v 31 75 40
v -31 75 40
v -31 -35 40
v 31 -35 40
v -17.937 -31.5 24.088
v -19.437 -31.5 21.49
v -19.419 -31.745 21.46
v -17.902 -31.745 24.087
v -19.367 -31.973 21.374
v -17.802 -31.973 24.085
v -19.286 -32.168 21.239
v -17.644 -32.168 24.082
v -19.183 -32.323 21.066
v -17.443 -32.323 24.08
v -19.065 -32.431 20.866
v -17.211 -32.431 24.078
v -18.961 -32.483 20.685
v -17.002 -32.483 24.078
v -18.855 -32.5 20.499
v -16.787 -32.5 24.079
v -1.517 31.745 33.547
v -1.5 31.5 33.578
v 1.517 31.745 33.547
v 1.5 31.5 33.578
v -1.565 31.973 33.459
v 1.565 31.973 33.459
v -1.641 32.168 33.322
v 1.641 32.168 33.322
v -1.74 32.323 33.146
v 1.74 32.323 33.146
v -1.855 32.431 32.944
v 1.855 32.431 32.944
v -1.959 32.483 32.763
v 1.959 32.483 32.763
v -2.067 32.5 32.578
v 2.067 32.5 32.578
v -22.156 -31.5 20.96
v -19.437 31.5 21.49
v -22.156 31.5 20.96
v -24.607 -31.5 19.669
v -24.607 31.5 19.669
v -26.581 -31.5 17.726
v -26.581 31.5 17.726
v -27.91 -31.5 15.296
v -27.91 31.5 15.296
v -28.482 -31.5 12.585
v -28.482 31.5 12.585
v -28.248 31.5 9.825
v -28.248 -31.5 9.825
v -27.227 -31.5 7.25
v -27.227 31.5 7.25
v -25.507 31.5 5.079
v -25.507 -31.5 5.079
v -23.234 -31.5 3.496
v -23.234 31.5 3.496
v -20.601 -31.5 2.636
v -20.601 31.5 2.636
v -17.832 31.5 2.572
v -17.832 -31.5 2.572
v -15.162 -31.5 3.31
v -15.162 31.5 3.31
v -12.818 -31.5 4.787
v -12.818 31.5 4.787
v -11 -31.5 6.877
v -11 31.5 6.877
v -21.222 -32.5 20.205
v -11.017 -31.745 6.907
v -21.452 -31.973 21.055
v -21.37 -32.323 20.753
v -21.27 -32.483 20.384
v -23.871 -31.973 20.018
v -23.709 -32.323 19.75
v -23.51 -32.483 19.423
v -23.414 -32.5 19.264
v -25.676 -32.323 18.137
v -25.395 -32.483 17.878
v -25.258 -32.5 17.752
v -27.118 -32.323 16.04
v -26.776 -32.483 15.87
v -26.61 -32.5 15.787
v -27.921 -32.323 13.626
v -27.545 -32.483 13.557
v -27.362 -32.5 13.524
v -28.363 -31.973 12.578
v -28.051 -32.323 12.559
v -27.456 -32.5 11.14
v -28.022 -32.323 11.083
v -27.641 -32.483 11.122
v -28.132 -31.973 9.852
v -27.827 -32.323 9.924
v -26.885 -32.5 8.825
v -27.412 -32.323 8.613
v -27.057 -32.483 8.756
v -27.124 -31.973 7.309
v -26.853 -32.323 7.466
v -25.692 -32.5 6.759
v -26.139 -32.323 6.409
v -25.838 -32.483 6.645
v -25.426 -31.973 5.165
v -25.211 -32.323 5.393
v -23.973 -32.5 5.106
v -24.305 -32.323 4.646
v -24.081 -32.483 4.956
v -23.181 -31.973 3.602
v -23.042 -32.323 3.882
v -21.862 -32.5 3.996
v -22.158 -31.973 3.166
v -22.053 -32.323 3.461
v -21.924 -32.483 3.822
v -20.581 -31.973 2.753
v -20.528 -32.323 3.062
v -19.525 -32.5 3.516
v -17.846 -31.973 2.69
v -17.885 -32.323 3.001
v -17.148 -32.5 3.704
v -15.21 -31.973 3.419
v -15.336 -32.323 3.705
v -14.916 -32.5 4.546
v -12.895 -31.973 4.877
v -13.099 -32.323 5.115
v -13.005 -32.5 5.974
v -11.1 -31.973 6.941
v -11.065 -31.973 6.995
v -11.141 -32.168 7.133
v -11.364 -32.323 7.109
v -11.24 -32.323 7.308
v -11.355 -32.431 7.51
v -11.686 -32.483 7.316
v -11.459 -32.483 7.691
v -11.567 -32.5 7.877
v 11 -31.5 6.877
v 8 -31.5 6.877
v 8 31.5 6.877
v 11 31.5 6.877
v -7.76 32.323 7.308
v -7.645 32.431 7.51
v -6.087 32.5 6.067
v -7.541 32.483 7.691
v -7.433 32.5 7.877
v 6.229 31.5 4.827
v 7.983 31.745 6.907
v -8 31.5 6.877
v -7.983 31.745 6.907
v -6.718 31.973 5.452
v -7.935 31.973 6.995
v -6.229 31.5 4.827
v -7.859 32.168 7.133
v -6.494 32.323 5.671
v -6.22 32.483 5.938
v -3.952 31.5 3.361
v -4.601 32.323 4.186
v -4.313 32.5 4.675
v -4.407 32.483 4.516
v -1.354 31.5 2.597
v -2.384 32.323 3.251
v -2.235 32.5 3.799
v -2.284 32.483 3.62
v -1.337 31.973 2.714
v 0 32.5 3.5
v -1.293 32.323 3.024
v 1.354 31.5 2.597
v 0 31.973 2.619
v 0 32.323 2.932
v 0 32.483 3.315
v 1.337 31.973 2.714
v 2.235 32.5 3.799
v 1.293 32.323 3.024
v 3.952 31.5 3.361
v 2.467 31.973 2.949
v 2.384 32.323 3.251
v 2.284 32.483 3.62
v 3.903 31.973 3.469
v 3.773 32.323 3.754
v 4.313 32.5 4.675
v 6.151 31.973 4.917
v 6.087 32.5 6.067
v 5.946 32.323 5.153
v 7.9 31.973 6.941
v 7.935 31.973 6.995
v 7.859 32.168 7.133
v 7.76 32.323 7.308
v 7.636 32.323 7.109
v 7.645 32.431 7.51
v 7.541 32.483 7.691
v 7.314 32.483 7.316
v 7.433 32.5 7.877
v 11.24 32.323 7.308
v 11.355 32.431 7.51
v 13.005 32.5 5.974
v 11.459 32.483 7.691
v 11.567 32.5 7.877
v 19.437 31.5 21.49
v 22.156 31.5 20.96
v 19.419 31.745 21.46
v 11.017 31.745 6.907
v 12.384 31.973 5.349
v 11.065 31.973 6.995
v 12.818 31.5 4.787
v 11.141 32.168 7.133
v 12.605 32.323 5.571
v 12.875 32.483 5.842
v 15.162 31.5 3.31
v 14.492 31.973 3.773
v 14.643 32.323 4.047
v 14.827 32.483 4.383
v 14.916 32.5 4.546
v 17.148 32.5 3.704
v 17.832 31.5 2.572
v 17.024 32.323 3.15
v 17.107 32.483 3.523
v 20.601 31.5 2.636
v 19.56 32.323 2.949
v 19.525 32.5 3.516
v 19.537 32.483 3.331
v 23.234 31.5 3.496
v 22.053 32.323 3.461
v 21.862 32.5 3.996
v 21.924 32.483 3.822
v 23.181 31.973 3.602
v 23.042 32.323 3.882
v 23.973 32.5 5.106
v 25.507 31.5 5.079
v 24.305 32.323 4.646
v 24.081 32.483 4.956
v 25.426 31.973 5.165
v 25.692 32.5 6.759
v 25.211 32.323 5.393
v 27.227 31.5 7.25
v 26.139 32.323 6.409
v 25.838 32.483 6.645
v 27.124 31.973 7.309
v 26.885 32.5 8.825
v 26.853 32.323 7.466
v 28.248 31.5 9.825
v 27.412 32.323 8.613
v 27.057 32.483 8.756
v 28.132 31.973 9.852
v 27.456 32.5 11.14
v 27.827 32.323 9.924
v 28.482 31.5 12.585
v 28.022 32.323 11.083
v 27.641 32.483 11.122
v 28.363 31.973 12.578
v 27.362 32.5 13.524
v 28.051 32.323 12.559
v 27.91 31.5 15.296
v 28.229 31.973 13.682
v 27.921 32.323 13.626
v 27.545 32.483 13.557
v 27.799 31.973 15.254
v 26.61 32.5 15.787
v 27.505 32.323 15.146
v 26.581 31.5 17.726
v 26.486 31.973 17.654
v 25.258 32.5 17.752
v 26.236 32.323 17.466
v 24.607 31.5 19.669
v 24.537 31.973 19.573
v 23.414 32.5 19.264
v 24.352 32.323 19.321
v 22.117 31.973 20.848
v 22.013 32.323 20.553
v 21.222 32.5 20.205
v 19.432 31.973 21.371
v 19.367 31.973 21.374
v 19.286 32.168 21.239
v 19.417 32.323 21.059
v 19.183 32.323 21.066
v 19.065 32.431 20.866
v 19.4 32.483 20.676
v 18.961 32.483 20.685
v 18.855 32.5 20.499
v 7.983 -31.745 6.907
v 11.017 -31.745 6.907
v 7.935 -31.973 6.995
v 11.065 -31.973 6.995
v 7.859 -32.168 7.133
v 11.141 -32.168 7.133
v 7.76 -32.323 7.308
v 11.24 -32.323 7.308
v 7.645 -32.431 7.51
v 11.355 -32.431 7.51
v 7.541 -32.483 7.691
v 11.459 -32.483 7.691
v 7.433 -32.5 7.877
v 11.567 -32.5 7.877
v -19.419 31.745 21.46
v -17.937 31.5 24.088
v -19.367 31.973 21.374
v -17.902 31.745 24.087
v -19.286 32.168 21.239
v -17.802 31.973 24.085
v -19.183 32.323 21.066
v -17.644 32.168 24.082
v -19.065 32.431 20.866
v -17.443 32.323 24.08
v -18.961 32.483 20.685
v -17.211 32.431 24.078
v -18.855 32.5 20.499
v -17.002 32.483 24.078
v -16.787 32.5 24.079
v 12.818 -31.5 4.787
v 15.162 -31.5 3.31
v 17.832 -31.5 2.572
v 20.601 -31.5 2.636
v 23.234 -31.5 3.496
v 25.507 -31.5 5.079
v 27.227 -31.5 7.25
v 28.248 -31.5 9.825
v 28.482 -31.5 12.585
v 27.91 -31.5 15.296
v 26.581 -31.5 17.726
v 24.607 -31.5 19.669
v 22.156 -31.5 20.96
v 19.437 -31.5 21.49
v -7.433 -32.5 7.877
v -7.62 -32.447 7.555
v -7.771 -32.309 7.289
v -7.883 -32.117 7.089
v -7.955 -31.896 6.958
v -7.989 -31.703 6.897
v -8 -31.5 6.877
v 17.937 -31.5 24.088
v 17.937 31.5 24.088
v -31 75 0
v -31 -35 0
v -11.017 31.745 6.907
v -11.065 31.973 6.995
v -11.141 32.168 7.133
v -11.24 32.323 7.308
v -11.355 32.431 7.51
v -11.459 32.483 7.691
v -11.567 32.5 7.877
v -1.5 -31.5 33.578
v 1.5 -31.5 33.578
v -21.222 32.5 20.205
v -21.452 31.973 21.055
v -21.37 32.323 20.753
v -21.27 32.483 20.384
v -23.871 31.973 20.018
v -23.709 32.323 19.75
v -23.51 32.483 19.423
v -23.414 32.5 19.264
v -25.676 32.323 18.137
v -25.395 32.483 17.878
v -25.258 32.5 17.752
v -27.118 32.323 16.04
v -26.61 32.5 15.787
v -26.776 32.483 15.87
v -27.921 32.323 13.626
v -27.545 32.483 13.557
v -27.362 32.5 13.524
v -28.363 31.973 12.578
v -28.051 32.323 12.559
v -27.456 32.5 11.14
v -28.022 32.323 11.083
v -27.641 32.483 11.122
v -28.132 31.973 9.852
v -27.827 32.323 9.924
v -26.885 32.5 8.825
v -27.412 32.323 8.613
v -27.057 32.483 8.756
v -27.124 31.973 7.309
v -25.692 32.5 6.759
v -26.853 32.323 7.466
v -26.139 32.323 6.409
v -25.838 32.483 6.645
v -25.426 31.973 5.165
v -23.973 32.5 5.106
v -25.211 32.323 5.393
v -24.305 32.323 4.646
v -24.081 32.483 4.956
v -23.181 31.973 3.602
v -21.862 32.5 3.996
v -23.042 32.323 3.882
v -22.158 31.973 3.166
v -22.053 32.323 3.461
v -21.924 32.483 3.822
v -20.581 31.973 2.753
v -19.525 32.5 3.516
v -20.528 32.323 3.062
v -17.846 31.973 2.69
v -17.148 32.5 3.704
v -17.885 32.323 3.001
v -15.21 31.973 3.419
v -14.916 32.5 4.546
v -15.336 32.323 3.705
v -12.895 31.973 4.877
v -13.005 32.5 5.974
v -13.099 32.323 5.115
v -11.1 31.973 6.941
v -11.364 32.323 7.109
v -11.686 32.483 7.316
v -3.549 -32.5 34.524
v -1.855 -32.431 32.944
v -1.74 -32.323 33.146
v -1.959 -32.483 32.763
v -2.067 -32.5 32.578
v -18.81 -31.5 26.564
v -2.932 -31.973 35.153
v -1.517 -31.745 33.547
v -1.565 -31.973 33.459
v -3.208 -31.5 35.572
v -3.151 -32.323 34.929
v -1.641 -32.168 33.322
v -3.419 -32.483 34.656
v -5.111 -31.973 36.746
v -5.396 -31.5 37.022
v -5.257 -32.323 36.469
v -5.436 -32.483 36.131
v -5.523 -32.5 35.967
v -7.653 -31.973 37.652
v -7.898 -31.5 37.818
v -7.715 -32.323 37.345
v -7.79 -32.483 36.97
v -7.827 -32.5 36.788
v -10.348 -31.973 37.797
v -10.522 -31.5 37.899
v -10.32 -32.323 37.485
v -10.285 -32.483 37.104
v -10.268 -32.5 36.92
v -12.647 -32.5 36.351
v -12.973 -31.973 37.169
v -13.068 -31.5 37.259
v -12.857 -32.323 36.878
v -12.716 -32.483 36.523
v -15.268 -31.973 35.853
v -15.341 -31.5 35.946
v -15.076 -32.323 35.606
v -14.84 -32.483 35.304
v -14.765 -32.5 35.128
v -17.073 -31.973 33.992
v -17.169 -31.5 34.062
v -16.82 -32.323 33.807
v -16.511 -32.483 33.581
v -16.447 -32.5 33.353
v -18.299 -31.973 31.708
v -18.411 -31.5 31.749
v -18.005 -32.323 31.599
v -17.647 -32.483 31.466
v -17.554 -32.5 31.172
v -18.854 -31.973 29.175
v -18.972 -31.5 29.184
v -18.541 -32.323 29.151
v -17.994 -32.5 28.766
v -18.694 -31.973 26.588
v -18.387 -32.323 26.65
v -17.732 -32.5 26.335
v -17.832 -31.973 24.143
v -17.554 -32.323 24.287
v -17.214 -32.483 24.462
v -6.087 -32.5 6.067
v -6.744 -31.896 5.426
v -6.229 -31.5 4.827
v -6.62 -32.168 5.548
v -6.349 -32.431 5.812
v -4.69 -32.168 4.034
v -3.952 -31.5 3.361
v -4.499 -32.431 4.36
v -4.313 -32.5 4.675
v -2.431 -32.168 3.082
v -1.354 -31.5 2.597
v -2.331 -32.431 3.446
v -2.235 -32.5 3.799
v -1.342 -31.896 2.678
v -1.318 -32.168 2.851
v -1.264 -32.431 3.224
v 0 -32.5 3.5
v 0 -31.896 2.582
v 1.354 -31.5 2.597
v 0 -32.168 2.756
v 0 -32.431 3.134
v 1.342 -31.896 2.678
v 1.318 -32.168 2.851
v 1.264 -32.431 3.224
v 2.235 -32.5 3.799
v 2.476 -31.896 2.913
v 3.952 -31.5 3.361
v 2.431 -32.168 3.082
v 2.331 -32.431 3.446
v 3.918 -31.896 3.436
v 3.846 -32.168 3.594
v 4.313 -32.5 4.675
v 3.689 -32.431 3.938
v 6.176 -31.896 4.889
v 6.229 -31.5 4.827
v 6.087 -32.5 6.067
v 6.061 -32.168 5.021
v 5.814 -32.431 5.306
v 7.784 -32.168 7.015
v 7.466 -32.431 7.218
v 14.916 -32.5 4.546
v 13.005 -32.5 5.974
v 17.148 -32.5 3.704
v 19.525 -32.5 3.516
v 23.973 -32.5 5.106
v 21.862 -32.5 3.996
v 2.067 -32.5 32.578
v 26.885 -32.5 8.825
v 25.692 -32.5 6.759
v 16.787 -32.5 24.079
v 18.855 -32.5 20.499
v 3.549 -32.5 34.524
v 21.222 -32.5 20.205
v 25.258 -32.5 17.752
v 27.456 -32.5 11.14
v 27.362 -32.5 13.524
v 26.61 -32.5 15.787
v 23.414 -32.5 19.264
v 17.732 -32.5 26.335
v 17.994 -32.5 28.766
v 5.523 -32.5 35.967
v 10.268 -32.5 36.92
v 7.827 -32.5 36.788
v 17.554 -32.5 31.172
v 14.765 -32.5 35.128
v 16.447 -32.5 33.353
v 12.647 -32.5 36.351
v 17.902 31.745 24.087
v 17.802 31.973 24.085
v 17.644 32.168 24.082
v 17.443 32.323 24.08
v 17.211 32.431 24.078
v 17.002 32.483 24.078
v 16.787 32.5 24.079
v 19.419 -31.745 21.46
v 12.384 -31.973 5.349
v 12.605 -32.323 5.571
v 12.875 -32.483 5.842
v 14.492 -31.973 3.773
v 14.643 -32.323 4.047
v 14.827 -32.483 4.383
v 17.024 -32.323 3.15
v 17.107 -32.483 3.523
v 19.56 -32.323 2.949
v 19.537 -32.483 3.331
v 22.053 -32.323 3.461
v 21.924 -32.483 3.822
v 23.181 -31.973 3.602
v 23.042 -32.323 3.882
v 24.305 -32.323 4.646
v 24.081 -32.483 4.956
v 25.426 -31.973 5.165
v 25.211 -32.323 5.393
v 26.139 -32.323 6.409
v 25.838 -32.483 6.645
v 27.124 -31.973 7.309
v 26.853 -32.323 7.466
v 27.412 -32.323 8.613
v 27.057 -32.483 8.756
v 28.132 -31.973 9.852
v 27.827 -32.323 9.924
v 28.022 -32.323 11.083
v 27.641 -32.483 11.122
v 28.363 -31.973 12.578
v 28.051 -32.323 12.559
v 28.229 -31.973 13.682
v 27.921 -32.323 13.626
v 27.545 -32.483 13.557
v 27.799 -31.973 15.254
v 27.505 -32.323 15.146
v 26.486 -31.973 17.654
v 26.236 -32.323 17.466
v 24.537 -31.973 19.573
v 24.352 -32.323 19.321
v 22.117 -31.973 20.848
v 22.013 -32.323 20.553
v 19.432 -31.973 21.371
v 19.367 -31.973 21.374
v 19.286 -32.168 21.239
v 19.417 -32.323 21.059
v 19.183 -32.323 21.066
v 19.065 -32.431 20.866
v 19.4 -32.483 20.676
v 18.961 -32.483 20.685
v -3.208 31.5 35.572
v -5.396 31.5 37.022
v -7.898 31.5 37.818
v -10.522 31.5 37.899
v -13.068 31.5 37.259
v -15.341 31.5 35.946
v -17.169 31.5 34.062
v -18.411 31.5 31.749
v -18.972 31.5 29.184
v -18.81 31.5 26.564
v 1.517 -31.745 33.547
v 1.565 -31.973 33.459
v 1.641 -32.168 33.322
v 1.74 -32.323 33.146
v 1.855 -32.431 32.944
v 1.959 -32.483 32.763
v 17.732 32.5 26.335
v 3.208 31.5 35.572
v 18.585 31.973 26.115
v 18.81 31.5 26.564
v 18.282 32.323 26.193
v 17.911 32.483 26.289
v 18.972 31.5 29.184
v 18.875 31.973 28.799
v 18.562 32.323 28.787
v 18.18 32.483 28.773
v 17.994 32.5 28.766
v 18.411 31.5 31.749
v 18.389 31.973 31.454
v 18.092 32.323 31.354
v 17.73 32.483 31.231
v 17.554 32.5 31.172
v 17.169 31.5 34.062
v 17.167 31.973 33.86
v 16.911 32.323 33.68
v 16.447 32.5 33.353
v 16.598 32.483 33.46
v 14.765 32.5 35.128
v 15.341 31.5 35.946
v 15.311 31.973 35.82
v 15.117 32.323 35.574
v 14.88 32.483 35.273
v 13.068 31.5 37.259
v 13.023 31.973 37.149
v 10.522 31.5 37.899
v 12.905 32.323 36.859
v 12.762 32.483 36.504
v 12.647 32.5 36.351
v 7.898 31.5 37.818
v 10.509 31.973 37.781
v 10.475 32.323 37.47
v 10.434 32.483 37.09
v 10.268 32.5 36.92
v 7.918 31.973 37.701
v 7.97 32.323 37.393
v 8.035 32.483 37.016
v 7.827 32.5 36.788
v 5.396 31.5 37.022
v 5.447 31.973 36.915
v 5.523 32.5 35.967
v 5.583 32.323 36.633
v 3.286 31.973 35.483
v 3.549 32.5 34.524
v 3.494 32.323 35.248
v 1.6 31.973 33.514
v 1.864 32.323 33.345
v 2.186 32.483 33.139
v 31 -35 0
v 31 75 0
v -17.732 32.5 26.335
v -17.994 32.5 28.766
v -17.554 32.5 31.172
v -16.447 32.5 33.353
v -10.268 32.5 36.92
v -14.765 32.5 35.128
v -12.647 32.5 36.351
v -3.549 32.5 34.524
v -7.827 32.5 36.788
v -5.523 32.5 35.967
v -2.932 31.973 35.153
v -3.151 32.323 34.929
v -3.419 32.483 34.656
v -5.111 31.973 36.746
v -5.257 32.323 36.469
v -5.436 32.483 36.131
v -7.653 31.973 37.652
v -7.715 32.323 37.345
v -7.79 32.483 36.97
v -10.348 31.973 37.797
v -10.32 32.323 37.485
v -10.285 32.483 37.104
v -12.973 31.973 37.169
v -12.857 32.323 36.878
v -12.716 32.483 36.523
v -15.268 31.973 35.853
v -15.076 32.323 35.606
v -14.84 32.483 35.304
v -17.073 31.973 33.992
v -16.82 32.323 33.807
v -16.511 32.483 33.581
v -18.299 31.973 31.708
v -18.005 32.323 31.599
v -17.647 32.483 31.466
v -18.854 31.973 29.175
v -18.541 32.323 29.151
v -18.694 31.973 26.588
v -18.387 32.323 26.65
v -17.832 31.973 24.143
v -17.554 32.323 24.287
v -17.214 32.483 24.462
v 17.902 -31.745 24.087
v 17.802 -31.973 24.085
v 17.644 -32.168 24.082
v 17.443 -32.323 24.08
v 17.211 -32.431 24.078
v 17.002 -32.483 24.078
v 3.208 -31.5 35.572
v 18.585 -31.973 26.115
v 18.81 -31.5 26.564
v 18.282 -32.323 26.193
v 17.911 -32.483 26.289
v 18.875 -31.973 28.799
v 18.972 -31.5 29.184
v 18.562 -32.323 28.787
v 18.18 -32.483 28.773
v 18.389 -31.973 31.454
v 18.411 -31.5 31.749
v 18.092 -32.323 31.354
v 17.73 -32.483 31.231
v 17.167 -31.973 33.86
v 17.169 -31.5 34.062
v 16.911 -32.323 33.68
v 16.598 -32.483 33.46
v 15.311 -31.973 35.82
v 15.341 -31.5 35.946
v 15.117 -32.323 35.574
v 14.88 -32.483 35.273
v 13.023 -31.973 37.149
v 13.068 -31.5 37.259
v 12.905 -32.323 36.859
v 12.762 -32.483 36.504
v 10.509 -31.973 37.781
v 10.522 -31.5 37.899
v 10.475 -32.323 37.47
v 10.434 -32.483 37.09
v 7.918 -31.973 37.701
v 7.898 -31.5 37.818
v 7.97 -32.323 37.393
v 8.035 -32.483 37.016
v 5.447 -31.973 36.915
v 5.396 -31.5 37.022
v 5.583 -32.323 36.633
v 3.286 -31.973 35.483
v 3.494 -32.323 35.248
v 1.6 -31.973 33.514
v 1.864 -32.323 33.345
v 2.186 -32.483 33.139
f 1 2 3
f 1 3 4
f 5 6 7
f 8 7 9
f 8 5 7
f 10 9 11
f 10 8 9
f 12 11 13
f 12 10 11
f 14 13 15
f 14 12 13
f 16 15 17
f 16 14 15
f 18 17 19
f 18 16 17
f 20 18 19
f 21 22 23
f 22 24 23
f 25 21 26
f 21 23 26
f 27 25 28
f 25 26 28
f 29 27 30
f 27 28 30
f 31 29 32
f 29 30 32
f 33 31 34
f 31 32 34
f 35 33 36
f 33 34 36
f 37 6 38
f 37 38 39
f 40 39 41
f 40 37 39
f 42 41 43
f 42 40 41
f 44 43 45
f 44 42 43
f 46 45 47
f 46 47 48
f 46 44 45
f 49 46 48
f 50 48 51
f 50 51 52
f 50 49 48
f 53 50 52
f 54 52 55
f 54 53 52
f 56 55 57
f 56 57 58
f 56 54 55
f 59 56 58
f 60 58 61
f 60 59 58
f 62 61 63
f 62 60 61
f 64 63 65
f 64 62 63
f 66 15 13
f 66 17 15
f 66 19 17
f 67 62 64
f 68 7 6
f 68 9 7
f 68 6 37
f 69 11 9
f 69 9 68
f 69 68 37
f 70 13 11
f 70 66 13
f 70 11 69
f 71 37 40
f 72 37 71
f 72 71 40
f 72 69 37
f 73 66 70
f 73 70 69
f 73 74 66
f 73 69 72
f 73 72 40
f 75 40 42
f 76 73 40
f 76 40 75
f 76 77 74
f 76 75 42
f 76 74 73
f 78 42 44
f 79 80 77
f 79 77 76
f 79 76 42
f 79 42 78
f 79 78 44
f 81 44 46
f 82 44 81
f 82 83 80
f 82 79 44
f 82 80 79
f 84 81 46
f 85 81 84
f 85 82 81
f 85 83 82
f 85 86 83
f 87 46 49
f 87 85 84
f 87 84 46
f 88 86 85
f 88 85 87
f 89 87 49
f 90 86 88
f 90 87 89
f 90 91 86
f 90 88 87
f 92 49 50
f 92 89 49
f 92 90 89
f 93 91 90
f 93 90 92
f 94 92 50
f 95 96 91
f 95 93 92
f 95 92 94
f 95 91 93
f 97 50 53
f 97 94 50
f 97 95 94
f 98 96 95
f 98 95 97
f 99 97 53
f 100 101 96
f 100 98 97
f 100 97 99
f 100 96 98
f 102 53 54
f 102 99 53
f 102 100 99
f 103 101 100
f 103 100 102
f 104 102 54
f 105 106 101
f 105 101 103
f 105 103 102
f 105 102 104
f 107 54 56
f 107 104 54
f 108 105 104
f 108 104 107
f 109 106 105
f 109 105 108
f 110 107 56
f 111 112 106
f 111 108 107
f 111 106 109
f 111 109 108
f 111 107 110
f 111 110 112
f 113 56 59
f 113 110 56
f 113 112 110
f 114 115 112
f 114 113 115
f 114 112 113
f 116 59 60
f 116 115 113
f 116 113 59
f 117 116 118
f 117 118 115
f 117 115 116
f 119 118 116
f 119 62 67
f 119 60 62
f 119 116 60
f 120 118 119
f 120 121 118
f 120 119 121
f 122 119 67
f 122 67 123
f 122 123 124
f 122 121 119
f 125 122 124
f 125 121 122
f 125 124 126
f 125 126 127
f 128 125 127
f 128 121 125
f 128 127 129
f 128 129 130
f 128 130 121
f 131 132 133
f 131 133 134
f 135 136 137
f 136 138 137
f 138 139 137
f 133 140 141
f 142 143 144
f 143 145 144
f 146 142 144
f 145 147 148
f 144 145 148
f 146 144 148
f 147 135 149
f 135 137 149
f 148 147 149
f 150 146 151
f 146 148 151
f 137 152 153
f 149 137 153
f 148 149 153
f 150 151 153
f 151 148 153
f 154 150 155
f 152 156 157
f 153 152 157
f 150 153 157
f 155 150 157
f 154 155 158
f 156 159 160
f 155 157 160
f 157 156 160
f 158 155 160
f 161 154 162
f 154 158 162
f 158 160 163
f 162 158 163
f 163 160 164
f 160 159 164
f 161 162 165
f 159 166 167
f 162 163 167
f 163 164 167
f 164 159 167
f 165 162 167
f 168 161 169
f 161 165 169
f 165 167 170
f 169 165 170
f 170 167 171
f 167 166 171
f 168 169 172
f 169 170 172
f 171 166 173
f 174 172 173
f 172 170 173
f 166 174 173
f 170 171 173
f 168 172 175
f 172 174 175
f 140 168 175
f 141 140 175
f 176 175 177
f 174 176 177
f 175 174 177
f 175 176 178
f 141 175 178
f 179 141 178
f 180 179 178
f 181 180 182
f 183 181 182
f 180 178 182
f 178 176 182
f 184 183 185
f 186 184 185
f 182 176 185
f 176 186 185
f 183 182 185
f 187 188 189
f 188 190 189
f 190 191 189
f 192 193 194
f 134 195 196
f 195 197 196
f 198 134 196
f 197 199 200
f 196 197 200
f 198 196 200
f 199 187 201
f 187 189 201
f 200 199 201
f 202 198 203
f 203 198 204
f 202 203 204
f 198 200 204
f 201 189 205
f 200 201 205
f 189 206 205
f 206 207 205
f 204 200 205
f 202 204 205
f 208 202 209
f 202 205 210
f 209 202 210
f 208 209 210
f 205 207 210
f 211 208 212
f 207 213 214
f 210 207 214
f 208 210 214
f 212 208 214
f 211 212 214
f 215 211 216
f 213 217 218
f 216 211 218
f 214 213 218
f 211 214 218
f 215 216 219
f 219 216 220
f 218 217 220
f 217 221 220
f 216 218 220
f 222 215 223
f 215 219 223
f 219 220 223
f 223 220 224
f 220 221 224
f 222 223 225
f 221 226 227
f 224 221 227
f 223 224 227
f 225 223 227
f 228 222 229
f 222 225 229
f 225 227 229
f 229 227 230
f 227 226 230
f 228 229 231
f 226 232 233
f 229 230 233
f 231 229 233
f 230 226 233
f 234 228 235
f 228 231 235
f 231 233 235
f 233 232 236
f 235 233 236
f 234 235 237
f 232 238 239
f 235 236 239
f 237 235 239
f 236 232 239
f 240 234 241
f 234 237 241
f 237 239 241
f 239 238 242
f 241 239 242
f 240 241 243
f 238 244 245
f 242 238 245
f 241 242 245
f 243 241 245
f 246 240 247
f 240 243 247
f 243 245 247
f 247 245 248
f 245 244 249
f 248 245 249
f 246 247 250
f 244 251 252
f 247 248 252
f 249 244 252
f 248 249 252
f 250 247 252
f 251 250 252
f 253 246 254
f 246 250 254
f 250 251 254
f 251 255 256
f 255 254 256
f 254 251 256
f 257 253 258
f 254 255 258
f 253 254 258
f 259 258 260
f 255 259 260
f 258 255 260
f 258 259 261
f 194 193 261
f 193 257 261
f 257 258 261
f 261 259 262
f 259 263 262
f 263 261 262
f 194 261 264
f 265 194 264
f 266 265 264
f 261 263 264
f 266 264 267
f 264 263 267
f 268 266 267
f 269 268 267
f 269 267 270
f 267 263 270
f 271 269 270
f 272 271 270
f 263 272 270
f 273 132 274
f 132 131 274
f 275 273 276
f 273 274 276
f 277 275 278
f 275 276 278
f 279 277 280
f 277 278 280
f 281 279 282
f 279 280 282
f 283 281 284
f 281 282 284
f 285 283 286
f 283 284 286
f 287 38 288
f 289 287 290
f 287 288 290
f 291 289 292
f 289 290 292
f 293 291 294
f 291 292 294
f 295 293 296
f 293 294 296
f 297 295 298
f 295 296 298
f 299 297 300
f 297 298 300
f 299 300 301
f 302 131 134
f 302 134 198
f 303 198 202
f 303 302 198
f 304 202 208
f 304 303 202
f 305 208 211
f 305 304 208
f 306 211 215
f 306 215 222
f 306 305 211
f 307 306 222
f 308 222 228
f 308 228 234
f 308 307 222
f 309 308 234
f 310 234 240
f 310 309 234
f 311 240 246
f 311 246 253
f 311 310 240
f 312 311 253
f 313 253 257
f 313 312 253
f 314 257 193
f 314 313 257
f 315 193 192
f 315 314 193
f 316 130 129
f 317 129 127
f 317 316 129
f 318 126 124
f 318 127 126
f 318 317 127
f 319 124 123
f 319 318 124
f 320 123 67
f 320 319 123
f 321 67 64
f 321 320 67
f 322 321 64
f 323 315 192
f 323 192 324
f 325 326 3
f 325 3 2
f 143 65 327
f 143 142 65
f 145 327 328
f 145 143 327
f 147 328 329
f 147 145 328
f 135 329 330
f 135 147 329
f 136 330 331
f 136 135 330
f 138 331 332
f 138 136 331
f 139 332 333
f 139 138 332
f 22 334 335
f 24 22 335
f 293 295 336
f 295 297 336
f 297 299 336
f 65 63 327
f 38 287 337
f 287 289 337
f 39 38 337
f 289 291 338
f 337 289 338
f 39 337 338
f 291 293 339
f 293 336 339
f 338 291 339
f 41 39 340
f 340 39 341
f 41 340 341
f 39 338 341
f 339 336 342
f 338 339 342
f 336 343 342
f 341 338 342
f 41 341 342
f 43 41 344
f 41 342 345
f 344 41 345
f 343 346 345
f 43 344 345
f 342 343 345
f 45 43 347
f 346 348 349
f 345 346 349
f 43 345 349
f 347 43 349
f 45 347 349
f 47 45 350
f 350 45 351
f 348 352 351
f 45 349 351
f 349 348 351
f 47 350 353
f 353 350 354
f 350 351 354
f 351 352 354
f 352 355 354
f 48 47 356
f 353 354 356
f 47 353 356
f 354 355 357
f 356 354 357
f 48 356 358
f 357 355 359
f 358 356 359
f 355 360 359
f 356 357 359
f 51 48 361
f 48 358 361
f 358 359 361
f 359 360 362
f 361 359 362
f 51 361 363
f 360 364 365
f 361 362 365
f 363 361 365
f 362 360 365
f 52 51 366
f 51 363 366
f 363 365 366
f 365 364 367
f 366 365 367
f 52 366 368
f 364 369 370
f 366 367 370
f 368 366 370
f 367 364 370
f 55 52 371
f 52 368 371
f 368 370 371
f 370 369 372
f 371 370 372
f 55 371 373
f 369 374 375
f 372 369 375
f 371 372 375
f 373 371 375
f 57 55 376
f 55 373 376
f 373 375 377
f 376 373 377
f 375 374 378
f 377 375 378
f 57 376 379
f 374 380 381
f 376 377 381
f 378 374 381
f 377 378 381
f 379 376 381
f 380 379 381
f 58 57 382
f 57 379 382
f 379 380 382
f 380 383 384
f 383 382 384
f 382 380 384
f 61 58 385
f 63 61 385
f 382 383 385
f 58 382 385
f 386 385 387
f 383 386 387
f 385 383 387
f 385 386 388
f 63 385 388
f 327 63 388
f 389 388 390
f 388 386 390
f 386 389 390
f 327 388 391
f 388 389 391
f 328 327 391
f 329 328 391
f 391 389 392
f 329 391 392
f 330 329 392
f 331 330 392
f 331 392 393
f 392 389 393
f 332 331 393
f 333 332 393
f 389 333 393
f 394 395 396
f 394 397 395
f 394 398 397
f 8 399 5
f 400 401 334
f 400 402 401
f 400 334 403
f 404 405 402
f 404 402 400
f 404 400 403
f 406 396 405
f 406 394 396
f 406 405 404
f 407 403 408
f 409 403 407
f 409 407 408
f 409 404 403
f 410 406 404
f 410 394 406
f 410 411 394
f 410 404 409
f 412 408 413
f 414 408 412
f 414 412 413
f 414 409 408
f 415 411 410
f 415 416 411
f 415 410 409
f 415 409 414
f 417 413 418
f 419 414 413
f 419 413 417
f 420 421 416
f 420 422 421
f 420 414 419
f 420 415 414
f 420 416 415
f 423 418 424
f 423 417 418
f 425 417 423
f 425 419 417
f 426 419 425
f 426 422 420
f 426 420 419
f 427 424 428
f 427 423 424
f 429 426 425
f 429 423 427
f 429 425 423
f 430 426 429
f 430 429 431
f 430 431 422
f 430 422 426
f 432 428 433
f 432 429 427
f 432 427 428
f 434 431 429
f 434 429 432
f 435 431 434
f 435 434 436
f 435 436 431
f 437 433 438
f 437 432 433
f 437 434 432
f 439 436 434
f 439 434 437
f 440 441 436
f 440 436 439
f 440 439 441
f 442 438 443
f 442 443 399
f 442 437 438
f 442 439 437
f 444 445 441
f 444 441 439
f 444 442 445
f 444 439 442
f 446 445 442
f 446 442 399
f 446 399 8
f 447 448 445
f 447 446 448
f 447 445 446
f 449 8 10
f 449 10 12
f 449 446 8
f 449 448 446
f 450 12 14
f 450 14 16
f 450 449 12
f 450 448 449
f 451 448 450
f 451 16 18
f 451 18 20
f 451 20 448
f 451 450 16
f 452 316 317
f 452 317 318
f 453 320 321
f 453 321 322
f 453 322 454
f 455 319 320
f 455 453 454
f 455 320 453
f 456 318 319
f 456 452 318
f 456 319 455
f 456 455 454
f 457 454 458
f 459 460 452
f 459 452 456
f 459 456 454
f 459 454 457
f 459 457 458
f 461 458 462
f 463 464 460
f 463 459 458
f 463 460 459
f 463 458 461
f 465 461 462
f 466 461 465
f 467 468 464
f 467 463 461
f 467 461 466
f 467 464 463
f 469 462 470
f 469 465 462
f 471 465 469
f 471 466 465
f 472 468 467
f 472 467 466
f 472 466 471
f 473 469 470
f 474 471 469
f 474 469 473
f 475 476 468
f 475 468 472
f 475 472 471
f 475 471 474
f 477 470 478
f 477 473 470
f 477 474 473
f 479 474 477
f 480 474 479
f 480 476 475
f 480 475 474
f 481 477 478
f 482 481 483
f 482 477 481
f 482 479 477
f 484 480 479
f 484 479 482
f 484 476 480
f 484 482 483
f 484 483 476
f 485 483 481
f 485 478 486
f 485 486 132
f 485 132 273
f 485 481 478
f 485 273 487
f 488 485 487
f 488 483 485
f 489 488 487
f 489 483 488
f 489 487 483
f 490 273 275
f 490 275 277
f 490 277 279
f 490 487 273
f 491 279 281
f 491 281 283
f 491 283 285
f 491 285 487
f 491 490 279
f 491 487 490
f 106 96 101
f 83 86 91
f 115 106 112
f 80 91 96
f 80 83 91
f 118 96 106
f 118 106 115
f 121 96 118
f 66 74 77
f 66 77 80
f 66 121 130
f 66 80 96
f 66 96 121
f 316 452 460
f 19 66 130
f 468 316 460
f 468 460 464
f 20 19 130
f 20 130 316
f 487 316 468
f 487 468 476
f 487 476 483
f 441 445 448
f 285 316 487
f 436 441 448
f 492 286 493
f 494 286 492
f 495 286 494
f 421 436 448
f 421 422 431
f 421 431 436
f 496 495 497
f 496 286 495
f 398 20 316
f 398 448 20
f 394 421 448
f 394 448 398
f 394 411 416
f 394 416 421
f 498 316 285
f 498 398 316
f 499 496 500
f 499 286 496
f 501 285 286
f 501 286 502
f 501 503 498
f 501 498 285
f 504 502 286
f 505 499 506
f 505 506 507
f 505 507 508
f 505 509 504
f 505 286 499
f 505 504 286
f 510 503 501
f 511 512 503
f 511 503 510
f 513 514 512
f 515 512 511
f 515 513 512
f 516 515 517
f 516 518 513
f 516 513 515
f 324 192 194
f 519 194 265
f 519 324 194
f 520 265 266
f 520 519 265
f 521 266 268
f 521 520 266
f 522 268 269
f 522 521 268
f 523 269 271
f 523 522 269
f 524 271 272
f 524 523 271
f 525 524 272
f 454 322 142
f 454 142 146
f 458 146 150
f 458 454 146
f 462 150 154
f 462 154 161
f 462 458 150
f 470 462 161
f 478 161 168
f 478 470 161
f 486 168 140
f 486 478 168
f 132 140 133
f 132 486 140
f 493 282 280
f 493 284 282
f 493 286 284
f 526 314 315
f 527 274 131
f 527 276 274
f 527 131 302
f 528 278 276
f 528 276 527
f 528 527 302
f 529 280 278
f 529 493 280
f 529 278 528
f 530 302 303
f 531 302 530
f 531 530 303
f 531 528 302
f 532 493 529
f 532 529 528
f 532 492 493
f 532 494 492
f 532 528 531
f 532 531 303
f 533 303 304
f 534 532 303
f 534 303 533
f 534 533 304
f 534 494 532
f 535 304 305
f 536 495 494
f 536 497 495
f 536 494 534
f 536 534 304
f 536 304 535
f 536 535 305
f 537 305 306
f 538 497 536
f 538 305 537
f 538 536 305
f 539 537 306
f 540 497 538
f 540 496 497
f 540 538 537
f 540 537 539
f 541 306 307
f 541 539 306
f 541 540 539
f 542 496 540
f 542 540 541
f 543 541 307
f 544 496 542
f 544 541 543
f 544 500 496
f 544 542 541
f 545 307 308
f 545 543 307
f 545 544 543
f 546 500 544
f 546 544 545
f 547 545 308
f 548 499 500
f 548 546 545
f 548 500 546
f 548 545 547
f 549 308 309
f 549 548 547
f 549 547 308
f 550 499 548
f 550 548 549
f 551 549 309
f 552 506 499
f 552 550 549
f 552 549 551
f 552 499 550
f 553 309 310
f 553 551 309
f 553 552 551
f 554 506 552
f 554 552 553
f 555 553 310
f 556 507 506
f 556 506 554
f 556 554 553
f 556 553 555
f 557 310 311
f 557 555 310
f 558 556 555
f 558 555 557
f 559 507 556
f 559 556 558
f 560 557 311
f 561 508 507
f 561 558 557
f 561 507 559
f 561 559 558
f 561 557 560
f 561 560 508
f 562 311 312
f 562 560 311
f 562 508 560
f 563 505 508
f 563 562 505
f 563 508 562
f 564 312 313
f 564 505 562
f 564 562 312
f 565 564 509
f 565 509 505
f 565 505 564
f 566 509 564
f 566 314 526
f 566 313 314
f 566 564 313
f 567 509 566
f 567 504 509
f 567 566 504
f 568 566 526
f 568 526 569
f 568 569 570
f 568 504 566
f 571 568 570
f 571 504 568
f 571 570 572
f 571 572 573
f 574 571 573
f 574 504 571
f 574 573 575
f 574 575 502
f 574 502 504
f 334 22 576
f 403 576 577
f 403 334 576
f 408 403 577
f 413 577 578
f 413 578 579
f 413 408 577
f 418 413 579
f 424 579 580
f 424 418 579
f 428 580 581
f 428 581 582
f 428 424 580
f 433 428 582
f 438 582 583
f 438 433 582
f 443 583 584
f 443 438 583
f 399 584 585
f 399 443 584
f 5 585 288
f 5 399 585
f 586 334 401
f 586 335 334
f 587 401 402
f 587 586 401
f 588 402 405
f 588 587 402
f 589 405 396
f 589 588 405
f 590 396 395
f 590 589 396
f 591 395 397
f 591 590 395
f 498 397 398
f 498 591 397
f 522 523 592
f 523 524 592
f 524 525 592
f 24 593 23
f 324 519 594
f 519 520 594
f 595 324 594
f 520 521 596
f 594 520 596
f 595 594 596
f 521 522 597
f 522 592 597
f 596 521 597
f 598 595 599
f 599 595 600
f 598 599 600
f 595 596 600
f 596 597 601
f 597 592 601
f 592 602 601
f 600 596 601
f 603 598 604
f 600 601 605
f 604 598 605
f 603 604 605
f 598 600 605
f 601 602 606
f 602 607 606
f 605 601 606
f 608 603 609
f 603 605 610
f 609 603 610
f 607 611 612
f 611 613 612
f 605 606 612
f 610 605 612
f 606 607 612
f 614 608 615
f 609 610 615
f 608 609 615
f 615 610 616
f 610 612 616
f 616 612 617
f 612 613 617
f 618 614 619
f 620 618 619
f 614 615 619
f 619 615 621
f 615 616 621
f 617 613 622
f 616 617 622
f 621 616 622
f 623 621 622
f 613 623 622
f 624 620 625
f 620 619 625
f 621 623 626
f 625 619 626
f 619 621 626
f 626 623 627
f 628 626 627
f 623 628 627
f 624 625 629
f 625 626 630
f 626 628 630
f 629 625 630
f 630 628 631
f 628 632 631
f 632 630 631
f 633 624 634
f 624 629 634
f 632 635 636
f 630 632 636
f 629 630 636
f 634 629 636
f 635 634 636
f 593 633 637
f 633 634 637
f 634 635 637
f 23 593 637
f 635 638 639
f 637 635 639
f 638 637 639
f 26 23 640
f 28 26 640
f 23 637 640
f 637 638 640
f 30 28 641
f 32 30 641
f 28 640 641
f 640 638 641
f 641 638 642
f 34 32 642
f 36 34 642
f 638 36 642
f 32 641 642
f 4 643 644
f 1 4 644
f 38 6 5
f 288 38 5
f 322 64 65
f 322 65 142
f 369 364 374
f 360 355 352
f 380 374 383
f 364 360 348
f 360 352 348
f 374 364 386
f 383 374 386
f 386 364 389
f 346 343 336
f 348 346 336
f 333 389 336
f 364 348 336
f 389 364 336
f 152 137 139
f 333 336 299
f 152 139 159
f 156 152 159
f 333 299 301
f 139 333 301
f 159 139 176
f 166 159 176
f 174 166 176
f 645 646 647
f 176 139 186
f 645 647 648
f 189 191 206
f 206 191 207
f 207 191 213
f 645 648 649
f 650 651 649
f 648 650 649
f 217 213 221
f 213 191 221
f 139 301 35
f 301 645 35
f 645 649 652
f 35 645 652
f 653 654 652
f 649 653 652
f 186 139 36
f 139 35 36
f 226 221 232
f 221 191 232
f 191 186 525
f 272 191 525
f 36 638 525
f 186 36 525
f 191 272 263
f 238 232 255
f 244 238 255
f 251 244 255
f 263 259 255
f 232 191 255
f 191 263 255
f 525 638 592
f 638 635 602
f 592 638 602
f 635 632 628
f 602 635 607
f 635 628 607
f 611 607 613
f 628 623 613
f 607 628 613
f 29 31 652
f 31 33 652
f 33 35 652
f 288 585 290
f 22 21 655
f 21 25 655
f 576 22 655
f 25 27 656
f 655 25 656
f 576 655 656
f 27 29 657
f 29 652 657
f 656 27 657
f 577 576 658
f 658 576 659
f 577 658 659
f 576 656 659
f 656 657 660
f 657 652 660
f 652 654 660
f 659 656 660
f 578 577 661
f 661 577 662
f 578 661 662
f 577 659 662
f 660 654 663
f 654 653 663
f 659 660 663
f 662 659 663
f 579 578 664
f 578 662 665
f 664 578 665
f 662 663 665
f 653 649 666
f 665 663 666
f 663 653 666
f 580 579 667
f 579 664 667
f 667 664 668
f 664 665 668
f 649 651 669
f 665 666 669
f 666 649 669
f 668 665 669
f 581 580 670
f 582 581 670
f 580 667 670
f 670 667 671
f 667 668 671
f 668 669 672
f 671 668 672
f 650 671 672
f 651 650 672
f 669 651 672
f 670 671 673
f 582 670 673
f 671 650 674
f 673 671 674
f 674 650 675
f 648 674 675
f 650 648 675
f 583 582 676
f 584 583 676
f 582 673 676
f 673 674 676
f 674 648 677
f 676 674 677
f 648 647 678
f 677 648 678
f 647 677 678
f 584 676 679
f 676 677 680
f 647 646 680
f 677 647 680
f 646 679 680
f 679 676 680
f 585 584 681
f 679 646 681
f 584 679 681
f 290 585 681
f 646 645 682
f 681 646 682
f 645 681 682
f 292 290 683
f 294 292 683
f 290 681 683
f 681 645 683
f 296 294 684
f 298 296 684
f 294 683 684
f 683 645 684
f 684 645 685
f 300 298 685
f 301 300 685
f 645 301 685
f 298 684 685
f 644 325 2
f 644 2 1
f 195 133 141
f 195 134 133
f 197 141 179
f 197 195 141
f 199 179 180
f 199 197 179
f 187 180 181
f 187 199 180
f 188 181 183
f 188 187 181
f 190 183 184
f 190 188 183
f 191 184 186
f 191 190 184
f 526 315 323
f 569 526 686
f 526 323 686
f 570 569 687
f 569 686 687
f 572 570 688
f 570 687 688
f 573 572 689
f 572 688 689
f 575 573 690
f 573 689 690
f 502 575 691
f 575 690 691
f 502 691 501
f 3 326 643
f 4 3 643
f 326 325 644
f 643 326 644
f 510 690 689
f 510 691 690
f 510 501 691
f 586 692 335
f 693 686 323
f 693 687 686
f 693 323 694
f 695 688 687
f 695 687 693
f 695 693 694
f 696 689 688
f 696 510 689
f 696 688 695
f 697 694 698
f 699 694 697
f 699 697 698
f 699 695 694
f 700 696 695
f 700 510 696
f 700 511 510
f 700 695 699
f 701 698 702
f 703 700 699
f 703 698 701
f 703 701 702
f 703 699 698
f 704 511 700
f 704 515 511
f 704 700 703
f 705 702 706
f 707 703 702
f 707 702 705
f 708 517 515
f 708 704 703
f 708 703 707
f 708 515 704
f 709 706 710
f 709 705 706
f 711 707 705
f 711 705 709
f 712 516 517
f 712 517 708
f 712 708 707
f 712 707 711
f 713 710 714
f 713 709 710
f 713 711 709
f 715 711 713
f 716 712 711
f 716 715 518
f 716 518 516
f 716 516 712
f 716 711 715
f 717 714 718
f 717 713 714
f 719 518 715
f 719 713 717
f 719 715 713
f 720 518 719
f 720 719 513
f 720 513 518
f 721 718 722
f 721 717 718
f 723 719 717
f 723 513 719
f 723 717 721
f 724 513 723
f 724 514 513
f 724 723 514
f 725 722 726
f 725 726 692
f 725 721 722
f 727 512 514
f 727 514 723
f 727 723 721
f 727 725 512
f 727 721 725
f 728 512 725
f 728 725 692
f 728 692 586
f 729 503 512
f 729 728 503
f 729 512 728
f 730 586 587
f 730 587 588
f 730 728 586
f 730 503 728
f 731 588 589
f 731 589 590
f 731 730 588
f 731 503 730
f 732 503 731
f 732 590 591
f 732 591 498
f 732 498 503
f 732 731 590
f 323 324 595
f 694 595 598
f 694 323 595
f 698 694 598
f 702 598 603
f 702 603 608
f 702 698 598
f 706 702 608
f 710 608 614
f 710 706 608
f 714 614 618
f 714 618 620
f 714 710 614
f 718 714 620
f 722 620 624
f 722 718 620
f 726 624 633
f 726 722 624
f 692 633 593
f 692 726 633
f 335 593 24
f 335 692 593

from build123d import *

# Parameters (mm, degrees)
PAD_DEPTH = 32.5
FILLET_R  = 1
BOX_W     = 62
BOX_H     = 110
BOX_DEPTH = 40


with BuildPart() as fillet_body:
    # Sketch → Pad (new body, symmetric)
    with BuildSketch(Plane.XZ):
        with BuildLine():
            ThreePointArc((-19.43706, 21.489941), (-27.227241, 7.25), (-11, 6.876525))
            Line((-11, 6.876525), (-8, 6.876525))
            ThreePointArc((-8, 6.876525), (0, 2.5), (8, 6.876525))
            Line((8, 6.876525), (11, 6.876525))
            ThreePointArc((11, 6.876525), (27.227241, 7.25), (19.43706, 21.489941))
            Line((19.43706, 21.489941), (17.93706, 24.088017))
            ThreePointArc((17.93706, 24.088017), (14.25, 36.681724), (1.5, 33.577958))
            Line((-1.5, 33.577958), (1.5, 33.577958))
            ThreePointArc((-1.5, 33.577958), (-14.25, 36.681724), (-17.93706, 24.088017))
            Line((-19.43706, 21.489941), (-17.93706, 24.088017))
        make_face()
    extrude(amount=PAD_DEPTH, both=True)

    # Fillet
    fillet_edges = [fillet_body.edges().sort_by_distance(p)[0] for p in [
        (-27.227241, -32.5, 7.25),
        (-9.5, -32.5, 6.876525),
        (0, -32.5, 2.5),
        (9.5, -32.5, 6.876525),
        (27.227241, -32.5, 7.25),
        (18.68706, -32.5, 22.788979),
        (14.25, -32.5, 36.681724),
        (0, -32.5, 33.577958),
        (-14.25, -32.5, 36.681724),
        (-18.68706, -32.5, 22.788979),
        (-27.227241, 32.5, 7.25),
        (-9.5, 32.5, 6.876525),
        (0, 32.5, 2.5),
        (9.5, 32.5, 6.876525),
        (27.227241, 32.5, 7.25),
        (18.68706, 32.5, 22.788979),
        (14.25, 32.5, 36.681724),
        (0, 32.5, 33.577958),
        (-14.25, 32.5, 36.681724),
        (-18.68706, 32.5, 22.788979),
    ]]
    fillet(fillet_edges, radius=FILLET_R)


with BuildPart() as cubo:
    # Box → Box (new body)
    with BuildSketch(Plane(origin=(-31, -35, 0), x_dir=(1, 0, 0), z_dir=(0, 0, 1))):
        with Locations((31, 55)):
            Rectangle(BOX_W, BOX_H)
    extrude(amount=BOX_DEPTH)


solid = Compound([fillet_body.part, cubo.part])
